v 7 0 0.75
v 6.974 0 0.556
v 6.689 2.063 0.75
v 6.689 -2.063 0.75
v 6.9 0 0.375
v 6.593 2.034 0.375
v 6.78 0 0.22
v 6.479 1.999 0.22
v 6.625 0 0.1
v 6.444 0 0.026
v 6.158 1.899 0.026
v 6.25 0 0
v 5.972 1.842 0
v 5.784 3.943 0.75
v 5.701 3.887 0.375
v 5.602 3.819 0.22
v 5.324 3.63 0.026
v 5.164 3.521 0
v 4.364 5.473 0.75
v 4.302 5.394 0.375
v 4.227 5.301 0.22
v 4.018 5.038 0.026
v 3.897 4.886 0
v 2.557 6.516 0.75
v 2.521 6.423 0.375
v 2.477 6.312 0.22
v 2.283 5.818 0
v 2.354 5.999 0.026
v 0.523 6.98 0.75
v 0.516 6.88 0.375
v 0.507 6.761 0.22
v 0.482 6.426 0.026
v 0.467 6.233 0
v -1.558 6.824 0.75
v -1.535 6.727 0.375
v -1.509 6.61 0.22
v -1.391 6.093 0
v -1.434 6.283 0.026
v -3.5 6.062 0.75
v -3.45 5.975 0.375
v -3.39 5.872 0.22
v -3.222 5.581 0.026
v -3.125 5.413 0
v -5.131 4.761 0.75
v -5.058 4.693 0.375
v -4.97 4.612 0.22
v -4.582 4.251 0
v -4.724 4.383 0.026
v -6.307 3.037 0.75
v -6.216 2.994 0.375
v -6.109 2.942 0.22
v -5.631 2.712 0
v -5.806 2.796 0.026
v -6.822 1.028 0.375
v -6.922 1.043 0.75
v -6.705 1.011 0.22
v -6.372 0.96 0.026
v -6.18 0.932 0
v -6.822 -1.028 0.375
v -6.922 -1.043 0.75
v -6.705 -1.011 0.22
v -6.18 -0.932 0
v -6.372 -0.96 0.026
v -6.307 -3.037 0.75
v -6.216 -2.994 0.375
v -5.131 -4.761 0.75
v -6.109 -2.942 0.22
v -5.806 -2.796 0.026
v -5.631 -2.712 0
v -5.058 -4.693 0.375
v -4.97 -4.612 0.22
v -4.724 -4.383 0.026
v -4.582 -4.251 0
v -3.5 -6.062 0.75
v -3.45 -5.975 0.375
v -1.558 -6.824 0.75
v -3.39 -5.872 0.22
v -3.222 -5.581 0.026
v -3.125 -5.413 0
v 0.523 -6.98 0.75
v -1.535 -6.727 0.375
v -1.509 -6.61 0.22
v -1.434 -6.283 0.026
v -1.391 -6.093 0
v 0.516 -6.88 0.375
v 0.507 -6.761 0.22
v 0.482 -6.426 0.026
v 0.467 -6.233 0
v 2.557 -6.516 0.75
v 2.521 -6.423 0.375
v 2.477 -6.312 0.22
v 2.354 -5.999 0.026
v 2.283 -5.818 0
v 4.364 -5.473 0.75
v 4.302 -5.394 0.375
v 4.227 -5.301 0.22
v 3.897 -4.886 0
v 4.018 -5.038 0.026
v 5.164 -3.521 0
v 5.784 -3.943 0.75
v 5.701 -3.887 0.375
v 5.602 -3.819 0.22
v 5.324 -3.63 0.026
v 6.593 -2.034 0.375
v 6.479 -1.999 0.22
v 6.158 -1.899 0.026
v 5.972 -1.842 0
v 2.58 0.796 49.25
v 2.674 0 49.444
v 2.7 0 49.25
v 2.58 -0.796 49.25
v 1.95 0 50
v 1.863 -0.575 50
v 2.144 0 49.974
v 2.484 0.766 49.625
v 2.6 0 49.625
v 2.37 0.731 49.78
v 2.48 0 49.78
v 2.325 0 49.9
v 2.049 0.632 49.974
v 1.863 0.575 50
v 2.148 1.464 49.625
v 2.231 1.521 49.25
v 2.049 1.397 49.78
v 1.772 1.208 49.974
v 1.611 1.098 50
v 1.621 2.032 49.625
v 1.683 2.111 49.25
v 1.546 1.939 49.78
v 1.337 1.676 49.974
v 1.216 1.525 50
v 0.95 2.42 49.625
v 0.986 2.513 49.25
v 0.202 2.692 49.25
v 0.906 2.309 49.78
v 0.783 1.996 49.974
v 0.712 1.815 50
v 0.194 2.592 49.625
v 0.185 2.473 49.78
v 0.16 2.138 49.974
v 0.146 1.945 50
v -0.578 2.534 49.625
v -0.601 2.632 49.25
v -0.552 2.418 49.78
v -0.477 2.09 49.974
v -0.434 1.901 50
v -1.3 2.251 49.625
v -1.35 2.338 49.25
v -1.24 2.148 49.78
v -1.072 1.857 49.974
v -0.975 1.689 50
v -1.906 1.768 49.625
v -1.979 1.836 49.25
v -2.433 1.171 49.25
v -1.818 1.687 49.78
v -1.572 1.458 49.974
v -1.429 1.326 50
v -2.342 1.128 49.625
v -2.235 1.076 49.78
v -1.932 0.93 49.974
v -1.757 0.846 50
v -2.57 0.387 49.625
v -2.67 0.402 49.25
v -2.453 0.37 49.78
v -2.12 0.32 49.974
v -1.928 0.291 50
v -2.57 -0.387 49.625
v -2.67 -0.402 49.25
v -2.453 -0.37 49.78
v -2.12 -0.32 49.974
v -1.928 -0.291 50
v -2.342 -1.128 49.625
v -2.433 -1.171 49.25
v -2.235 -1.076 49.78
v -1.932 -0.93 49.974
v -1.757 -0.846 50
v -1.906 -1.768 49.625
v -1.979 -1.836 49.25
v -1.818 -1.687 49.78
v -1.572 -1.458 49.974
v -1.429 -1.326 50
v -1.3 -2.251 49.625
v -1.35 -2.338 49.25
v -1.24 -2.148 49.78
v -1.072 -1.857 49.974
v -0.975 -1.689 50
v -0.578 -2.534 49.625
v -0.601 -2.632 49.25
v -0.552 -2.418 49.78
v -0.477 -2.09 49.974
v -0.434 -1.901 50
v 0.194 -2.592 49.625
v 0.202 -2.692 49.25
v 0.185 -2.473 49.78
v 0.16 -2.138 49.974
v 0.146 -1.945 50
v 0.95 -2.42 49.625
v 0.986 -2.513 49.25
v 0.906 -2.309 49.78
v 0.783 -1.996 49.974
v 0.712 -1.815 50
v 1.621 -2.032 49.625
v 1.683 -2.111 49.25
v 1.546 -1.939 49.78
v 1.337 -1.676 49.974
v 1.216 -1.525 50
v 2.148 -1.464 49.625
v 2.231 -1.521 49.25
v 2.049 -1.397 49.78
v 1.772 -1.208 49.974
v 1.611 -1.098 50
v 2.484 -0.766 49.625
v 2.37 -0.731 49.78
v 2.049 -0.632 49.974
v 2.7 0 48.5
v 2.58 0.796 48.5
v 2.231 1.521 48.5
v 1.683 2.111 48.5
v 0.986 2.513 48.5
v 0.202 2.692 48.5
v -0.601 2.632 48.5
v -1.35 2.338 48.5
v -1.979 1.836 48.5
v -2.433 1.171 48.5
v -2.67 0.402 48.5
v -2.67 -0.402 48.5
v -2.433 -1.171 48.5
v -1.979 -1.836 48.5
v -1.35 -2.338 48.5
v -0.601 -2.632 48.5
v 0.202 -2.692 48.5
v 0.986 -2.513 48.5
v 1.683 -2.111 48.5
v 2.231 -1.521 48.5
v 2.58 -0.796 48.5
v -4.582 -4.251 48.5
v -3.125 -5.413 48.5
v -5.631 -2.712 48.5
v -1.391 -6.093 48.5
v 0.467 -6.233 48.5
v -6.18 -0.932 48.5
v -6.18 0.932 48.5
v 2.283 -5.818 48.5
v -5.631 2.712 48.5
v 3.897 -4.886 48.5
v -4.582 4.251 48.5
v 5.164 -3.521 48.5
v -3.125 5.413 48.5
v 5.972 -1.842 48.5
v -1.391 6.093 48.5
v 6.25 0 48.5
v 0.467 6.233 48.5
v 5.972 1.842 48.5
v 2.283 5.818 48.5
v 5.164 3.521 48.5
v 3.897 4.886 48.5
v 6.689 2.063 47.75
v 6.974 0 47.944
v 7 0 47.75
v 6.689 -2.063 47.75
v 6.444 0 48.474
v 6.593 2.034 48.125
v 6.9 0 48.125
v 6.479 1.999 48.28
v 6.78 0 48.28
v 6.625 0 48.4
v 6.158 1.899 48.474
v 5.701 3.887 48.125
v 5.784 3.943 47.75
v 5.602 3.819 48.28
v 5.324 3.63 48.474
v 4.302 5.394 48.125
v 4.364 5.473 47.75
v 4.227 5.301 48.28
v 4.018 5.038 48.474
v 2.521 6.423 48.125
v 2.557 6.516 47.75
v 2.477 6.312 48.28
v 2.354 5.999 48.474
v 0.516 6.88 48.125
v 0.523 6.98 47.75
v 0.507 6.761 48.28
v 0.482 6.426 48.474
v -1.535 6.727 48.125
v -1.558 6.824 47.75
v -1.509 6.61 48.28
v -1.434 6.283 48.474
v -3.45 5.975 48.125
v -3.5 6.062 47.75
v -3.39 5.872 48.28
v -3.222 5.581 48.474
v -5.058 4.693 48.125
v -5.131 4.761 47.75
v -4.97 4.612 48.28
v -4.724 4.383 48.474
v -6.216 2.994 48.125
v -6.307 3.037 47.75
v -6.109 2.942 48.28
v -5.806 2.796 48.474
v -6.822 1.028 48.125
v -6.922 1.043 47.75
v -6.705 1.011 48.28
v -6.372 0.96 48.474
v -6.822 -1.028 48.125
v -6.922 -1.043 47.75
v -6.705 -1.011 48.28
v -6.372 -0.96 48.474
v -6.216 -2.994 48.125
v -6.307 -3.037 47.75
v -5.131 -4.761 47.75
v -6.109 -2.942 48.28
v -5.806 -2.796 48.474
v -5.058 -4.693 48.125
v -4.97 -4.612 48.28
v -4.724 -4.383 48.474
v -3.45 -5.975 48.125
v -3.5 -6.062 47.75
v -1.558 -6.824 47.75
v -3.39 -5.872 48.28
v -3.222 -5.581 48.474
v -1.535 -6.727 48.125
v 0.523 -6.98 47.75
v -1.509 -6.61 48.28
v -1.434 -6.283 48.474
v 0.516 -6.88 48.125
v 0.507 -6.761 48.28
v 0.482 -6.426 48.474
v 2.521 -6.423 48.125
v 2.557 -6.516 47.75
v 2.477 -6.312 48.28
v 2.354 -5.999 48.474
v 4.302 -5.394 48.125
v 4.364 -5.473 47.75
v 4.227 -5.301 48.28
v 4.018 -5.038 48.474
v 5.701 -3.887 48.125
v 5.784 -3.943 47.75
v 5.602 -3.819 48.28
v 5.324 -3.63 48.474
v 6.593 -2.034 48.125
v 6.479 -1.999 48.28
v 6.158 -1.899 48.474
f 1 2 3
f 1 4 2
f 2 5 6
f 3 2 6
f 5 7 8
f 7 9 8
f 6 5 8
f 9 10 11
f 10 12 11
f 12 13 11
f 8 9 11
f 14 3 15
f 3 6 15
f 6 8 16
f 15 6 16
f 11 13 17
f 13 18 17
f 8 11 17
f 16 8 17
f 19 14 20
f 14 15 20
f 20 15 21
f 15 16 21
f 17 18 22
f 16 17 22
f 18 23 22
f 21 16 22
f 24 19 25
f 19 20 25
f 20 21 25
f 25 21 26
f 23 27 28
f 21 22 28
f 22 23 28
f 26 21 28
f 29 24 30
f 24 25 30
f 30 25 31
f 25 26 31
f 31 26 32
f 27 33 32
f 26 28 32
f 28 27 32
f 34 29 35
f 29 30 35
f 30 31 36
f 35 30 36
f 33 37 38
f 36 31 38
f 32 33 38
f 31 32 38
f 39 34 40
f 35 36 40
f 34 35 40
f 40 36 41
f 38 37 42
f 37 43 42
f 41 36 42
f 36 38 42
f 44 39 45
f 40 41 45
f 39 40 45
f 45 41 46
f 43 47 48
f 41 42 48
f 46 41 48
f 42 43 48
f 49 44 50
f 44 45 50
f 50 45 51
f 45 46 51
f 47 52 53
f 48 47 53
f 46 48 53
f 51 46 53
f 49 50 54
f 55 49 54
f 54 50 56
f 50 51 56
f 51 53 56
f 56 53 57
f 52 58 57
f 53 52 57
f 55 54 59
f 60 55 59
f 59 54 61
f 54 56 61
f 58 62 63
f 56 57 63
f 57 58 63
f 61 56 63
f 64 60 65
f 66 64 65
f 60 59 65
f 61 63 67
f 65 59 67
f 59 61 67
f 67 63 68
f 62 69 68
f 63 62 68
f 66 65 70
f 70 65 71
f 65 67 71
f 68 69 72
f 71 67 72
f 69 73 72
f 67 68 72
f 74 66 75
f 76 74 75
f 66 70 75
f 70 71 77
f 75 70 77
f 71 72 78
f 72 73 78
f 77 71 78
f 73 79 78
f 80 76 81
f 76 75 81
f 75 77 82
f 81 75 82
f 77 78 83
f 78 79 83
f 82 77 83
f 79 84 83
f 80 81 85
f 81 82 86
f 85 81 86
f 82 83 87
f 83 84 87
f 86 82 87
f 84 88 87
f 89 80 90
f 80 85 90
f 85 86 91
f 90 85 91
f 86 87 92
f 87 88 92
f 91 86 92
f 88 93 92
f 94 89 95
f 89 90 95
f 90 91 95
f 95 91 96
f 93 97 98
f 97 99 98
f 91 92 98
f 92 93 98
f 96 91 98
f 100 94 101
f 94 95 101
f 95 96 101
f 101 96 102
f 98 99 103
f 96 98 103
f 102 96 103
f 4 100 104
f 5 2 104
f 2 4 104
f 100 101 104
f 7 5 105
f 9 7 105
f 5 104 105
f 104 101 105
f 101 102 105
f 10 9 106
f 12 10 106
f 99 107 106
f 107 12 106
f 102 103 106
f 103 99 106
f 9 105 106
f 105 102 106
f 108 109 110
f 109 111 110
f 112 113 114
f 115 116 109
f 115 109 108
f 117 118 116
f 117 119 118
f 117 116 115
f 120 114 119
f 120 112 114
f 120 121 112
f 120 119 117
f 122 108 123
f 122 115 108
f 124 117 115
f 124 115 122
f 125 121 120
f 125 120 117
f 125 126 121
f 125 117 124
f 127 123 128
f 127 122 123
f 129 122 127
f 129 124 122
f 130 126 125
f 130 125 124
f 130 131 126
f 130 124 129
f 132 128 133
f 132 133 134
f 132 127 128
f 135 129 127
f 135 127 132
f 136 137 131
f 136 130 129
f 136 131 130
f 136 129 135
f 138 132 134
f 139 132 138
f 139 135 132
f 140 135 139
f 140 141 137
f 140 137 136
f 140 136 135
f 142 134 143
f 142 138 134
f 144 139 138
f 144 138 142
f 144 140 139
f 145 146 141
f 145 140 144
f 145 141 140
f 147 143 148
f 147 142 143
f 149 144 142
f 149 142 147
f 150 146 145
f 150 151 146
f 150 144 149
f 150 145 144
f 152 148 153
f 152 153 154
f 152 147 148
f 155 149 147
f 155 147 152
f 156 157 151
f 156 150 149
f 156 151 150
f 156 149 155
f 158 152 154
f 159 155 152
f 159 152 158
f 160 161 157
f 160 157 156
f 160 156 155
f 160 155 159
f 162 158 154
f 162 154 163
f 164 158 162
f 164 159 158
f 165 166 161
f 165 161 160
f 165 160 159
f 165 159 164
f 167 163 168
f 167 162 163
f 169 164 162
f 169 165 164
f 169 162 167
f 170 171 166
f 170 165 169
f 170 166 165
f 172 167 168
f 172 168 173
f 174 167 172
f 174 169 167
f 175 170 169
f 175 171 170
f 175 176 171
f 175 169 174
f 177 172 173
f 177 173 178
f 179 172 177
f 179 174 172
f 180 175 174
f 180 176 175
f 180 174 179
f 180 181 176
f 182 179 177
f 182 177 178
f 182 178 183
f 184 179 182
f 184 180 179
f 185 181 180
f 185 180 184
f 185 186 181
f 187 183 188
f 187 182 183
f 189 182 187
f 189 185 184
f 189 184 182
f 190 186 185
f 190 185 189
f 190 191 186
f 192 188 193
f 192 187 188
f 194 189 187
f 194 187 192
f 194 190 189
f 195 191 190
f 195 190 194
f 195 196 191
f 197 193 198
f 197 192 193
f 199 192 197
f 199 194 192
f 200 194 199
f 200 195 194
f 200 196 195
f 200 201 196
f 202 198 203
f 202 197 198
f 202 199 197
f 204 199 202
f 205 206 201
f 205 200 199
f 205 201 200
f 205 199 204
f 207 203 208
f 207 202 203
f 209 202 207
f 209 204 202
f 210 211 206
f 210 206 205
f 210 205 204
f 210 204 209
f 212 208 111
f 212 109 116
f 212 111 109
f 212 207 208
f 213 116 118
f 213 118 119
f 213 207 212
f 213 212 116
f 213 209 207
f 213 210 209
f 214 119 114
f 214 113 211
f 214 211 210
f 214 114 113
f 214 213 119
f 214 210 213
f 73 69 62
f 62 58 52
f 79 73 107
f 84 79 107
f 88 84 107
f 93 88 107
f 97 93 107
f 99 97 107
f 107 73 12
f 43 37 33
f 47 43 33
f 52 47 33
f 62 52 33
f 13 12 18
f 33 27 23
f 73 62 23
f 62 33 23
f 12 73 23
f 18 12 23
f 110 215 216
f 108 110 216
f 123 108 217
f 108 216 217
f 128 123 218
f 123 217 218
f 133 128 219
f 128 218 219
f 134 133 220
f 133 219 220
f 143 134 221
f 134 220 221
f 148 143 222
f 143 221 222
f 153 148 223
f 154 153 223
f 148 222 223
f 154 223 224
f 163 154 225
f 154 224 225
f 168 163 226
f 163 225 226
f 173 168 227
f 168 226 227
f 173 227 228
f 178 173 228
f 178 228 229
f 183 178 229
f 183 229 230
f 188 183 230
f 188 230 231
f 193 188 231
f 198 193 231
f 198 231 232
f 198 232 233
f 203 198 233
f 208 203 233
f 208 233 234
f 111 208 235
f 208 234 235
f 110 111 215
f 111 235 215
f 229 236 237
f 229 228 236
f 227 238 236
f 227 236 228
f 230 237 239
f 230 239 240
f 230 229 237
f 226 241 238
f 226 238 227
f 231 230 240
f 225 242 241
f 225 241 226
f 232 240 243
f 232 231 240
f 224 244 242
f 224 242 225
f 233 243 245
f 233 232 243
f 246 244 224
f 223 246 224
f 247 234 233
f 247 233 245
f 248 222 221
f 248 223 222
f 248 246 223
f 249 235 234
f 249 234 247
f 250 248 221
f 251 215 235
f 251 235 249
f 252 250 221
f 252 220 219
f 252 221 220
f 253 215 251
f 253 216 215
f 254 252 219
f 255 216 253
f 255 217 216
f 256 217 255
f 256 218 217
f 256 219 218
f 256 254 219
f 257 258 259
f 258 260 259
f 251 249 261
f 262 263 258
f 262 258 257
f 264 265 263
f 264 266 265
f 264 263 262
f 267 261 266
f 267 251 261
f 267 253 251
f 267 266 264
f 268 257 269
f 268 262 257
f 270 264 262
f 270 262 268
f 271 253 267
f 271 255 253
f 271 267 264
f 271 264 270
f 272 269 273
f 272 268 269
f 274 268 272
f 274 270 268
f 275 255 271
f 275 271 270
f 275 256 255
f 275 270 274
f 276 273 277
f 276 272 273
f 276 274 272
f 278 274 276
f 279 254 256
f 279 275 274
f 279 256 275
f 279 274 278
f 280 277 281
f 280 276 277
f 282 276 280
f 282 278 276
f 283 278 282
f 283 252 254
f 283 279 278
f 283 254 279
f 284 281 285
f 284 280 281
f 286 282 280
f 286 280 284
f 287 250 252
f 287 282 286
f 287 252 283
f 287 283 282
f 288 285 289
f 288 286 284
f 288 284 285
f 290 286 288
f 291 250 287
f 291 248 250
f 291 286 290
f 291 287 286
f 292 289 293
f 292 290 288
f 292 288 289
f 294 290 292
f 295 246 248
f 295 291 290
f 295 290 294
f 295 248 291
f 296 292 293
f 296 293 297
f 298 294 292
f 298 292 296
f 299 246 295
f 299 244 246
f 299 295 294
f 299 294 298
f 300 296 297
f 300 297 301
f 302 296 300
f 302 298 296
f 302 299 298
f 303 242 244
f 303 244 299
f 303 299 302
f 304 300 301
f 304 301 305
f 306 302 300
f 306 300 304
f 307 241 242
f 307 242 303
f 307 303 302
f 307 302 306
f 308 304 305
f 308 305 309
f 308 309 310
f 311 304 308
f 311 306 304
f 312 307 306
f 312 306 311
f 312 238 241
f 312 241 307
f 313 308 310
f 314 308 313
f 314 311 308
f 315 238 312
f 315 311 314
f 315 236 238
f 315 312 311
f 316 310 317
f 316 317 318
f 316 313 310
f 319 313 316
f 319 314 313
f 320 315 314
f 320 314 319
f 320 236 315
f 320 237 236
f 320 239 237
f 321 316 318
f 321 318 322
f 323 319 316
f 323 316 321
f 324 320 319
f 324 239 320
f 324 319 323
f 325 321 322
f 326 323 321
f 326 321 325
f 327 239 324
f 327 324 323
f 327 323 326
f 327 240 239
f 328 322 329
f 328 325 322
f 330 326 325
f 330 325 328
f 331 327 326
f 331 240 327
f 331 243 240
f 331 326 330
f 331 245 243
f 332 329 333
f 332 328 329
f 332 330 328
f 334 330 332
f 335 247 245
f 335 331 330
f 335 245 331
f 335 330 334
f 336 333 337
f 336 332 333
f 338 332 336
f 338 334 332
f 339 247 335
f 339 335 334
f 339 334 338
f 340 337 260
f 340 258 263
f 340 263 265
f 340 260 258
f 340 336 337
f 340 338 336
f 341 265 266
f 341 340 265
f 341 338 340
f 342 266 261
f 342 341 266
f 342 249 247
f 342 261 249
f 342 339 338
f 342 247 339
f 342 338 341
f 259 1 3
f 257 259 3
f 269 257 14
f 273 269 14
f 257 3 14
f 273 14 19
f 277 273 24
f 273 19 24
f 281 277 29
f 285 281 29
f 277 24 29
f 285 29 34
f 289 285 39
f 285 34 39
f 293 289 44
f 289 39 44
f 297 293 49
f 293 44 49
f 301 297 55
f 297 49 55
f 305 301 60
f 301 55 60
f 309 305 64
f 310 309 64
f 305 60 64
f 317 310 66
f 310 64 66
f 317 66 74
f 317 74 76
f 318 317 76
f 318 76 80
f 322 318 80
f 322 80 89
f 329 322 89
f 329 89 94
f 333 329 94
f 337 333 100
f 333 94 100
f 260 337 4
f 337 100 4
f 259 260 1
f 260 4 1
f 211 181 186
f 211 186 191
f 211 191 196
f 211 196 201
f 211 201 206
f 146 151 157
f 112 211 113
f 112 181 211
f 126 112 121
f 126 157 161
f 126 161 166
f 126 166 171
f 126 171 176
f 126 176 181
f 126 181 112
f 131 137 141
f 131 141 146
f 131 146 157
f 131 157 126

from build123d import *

# Parameters (mm, degrees)
F0_R     = 7
F1_DEPTH = 48.5
F2_R     = 2.7
F3_DEPTH = 1.5
F4_R     = 0.75


with BuildPart() as f1:
    # F0 (on Top) → F1 (new body)
    with BuildSketch(Plane.XY):
        Circle(F0_R)
    extrude(amount=F1_DEPTH)

    # F2 (on face) → F3 (join)
    with BuildSketch(Plane.XY.offset(48.5)):
        Circle(F2_R)
    extrude(amount=F3_DEPTH)

    # F4
    f4_edges = [f1.edges().sort_by_distance(p)[0] for p in [
        (-2.7, 0, 50),
        (-7, 0, 48.5),
        (-7, 0, 0),
    ]]
    fillet(f4_edges, radius=F4_R)


solid = f1.part
